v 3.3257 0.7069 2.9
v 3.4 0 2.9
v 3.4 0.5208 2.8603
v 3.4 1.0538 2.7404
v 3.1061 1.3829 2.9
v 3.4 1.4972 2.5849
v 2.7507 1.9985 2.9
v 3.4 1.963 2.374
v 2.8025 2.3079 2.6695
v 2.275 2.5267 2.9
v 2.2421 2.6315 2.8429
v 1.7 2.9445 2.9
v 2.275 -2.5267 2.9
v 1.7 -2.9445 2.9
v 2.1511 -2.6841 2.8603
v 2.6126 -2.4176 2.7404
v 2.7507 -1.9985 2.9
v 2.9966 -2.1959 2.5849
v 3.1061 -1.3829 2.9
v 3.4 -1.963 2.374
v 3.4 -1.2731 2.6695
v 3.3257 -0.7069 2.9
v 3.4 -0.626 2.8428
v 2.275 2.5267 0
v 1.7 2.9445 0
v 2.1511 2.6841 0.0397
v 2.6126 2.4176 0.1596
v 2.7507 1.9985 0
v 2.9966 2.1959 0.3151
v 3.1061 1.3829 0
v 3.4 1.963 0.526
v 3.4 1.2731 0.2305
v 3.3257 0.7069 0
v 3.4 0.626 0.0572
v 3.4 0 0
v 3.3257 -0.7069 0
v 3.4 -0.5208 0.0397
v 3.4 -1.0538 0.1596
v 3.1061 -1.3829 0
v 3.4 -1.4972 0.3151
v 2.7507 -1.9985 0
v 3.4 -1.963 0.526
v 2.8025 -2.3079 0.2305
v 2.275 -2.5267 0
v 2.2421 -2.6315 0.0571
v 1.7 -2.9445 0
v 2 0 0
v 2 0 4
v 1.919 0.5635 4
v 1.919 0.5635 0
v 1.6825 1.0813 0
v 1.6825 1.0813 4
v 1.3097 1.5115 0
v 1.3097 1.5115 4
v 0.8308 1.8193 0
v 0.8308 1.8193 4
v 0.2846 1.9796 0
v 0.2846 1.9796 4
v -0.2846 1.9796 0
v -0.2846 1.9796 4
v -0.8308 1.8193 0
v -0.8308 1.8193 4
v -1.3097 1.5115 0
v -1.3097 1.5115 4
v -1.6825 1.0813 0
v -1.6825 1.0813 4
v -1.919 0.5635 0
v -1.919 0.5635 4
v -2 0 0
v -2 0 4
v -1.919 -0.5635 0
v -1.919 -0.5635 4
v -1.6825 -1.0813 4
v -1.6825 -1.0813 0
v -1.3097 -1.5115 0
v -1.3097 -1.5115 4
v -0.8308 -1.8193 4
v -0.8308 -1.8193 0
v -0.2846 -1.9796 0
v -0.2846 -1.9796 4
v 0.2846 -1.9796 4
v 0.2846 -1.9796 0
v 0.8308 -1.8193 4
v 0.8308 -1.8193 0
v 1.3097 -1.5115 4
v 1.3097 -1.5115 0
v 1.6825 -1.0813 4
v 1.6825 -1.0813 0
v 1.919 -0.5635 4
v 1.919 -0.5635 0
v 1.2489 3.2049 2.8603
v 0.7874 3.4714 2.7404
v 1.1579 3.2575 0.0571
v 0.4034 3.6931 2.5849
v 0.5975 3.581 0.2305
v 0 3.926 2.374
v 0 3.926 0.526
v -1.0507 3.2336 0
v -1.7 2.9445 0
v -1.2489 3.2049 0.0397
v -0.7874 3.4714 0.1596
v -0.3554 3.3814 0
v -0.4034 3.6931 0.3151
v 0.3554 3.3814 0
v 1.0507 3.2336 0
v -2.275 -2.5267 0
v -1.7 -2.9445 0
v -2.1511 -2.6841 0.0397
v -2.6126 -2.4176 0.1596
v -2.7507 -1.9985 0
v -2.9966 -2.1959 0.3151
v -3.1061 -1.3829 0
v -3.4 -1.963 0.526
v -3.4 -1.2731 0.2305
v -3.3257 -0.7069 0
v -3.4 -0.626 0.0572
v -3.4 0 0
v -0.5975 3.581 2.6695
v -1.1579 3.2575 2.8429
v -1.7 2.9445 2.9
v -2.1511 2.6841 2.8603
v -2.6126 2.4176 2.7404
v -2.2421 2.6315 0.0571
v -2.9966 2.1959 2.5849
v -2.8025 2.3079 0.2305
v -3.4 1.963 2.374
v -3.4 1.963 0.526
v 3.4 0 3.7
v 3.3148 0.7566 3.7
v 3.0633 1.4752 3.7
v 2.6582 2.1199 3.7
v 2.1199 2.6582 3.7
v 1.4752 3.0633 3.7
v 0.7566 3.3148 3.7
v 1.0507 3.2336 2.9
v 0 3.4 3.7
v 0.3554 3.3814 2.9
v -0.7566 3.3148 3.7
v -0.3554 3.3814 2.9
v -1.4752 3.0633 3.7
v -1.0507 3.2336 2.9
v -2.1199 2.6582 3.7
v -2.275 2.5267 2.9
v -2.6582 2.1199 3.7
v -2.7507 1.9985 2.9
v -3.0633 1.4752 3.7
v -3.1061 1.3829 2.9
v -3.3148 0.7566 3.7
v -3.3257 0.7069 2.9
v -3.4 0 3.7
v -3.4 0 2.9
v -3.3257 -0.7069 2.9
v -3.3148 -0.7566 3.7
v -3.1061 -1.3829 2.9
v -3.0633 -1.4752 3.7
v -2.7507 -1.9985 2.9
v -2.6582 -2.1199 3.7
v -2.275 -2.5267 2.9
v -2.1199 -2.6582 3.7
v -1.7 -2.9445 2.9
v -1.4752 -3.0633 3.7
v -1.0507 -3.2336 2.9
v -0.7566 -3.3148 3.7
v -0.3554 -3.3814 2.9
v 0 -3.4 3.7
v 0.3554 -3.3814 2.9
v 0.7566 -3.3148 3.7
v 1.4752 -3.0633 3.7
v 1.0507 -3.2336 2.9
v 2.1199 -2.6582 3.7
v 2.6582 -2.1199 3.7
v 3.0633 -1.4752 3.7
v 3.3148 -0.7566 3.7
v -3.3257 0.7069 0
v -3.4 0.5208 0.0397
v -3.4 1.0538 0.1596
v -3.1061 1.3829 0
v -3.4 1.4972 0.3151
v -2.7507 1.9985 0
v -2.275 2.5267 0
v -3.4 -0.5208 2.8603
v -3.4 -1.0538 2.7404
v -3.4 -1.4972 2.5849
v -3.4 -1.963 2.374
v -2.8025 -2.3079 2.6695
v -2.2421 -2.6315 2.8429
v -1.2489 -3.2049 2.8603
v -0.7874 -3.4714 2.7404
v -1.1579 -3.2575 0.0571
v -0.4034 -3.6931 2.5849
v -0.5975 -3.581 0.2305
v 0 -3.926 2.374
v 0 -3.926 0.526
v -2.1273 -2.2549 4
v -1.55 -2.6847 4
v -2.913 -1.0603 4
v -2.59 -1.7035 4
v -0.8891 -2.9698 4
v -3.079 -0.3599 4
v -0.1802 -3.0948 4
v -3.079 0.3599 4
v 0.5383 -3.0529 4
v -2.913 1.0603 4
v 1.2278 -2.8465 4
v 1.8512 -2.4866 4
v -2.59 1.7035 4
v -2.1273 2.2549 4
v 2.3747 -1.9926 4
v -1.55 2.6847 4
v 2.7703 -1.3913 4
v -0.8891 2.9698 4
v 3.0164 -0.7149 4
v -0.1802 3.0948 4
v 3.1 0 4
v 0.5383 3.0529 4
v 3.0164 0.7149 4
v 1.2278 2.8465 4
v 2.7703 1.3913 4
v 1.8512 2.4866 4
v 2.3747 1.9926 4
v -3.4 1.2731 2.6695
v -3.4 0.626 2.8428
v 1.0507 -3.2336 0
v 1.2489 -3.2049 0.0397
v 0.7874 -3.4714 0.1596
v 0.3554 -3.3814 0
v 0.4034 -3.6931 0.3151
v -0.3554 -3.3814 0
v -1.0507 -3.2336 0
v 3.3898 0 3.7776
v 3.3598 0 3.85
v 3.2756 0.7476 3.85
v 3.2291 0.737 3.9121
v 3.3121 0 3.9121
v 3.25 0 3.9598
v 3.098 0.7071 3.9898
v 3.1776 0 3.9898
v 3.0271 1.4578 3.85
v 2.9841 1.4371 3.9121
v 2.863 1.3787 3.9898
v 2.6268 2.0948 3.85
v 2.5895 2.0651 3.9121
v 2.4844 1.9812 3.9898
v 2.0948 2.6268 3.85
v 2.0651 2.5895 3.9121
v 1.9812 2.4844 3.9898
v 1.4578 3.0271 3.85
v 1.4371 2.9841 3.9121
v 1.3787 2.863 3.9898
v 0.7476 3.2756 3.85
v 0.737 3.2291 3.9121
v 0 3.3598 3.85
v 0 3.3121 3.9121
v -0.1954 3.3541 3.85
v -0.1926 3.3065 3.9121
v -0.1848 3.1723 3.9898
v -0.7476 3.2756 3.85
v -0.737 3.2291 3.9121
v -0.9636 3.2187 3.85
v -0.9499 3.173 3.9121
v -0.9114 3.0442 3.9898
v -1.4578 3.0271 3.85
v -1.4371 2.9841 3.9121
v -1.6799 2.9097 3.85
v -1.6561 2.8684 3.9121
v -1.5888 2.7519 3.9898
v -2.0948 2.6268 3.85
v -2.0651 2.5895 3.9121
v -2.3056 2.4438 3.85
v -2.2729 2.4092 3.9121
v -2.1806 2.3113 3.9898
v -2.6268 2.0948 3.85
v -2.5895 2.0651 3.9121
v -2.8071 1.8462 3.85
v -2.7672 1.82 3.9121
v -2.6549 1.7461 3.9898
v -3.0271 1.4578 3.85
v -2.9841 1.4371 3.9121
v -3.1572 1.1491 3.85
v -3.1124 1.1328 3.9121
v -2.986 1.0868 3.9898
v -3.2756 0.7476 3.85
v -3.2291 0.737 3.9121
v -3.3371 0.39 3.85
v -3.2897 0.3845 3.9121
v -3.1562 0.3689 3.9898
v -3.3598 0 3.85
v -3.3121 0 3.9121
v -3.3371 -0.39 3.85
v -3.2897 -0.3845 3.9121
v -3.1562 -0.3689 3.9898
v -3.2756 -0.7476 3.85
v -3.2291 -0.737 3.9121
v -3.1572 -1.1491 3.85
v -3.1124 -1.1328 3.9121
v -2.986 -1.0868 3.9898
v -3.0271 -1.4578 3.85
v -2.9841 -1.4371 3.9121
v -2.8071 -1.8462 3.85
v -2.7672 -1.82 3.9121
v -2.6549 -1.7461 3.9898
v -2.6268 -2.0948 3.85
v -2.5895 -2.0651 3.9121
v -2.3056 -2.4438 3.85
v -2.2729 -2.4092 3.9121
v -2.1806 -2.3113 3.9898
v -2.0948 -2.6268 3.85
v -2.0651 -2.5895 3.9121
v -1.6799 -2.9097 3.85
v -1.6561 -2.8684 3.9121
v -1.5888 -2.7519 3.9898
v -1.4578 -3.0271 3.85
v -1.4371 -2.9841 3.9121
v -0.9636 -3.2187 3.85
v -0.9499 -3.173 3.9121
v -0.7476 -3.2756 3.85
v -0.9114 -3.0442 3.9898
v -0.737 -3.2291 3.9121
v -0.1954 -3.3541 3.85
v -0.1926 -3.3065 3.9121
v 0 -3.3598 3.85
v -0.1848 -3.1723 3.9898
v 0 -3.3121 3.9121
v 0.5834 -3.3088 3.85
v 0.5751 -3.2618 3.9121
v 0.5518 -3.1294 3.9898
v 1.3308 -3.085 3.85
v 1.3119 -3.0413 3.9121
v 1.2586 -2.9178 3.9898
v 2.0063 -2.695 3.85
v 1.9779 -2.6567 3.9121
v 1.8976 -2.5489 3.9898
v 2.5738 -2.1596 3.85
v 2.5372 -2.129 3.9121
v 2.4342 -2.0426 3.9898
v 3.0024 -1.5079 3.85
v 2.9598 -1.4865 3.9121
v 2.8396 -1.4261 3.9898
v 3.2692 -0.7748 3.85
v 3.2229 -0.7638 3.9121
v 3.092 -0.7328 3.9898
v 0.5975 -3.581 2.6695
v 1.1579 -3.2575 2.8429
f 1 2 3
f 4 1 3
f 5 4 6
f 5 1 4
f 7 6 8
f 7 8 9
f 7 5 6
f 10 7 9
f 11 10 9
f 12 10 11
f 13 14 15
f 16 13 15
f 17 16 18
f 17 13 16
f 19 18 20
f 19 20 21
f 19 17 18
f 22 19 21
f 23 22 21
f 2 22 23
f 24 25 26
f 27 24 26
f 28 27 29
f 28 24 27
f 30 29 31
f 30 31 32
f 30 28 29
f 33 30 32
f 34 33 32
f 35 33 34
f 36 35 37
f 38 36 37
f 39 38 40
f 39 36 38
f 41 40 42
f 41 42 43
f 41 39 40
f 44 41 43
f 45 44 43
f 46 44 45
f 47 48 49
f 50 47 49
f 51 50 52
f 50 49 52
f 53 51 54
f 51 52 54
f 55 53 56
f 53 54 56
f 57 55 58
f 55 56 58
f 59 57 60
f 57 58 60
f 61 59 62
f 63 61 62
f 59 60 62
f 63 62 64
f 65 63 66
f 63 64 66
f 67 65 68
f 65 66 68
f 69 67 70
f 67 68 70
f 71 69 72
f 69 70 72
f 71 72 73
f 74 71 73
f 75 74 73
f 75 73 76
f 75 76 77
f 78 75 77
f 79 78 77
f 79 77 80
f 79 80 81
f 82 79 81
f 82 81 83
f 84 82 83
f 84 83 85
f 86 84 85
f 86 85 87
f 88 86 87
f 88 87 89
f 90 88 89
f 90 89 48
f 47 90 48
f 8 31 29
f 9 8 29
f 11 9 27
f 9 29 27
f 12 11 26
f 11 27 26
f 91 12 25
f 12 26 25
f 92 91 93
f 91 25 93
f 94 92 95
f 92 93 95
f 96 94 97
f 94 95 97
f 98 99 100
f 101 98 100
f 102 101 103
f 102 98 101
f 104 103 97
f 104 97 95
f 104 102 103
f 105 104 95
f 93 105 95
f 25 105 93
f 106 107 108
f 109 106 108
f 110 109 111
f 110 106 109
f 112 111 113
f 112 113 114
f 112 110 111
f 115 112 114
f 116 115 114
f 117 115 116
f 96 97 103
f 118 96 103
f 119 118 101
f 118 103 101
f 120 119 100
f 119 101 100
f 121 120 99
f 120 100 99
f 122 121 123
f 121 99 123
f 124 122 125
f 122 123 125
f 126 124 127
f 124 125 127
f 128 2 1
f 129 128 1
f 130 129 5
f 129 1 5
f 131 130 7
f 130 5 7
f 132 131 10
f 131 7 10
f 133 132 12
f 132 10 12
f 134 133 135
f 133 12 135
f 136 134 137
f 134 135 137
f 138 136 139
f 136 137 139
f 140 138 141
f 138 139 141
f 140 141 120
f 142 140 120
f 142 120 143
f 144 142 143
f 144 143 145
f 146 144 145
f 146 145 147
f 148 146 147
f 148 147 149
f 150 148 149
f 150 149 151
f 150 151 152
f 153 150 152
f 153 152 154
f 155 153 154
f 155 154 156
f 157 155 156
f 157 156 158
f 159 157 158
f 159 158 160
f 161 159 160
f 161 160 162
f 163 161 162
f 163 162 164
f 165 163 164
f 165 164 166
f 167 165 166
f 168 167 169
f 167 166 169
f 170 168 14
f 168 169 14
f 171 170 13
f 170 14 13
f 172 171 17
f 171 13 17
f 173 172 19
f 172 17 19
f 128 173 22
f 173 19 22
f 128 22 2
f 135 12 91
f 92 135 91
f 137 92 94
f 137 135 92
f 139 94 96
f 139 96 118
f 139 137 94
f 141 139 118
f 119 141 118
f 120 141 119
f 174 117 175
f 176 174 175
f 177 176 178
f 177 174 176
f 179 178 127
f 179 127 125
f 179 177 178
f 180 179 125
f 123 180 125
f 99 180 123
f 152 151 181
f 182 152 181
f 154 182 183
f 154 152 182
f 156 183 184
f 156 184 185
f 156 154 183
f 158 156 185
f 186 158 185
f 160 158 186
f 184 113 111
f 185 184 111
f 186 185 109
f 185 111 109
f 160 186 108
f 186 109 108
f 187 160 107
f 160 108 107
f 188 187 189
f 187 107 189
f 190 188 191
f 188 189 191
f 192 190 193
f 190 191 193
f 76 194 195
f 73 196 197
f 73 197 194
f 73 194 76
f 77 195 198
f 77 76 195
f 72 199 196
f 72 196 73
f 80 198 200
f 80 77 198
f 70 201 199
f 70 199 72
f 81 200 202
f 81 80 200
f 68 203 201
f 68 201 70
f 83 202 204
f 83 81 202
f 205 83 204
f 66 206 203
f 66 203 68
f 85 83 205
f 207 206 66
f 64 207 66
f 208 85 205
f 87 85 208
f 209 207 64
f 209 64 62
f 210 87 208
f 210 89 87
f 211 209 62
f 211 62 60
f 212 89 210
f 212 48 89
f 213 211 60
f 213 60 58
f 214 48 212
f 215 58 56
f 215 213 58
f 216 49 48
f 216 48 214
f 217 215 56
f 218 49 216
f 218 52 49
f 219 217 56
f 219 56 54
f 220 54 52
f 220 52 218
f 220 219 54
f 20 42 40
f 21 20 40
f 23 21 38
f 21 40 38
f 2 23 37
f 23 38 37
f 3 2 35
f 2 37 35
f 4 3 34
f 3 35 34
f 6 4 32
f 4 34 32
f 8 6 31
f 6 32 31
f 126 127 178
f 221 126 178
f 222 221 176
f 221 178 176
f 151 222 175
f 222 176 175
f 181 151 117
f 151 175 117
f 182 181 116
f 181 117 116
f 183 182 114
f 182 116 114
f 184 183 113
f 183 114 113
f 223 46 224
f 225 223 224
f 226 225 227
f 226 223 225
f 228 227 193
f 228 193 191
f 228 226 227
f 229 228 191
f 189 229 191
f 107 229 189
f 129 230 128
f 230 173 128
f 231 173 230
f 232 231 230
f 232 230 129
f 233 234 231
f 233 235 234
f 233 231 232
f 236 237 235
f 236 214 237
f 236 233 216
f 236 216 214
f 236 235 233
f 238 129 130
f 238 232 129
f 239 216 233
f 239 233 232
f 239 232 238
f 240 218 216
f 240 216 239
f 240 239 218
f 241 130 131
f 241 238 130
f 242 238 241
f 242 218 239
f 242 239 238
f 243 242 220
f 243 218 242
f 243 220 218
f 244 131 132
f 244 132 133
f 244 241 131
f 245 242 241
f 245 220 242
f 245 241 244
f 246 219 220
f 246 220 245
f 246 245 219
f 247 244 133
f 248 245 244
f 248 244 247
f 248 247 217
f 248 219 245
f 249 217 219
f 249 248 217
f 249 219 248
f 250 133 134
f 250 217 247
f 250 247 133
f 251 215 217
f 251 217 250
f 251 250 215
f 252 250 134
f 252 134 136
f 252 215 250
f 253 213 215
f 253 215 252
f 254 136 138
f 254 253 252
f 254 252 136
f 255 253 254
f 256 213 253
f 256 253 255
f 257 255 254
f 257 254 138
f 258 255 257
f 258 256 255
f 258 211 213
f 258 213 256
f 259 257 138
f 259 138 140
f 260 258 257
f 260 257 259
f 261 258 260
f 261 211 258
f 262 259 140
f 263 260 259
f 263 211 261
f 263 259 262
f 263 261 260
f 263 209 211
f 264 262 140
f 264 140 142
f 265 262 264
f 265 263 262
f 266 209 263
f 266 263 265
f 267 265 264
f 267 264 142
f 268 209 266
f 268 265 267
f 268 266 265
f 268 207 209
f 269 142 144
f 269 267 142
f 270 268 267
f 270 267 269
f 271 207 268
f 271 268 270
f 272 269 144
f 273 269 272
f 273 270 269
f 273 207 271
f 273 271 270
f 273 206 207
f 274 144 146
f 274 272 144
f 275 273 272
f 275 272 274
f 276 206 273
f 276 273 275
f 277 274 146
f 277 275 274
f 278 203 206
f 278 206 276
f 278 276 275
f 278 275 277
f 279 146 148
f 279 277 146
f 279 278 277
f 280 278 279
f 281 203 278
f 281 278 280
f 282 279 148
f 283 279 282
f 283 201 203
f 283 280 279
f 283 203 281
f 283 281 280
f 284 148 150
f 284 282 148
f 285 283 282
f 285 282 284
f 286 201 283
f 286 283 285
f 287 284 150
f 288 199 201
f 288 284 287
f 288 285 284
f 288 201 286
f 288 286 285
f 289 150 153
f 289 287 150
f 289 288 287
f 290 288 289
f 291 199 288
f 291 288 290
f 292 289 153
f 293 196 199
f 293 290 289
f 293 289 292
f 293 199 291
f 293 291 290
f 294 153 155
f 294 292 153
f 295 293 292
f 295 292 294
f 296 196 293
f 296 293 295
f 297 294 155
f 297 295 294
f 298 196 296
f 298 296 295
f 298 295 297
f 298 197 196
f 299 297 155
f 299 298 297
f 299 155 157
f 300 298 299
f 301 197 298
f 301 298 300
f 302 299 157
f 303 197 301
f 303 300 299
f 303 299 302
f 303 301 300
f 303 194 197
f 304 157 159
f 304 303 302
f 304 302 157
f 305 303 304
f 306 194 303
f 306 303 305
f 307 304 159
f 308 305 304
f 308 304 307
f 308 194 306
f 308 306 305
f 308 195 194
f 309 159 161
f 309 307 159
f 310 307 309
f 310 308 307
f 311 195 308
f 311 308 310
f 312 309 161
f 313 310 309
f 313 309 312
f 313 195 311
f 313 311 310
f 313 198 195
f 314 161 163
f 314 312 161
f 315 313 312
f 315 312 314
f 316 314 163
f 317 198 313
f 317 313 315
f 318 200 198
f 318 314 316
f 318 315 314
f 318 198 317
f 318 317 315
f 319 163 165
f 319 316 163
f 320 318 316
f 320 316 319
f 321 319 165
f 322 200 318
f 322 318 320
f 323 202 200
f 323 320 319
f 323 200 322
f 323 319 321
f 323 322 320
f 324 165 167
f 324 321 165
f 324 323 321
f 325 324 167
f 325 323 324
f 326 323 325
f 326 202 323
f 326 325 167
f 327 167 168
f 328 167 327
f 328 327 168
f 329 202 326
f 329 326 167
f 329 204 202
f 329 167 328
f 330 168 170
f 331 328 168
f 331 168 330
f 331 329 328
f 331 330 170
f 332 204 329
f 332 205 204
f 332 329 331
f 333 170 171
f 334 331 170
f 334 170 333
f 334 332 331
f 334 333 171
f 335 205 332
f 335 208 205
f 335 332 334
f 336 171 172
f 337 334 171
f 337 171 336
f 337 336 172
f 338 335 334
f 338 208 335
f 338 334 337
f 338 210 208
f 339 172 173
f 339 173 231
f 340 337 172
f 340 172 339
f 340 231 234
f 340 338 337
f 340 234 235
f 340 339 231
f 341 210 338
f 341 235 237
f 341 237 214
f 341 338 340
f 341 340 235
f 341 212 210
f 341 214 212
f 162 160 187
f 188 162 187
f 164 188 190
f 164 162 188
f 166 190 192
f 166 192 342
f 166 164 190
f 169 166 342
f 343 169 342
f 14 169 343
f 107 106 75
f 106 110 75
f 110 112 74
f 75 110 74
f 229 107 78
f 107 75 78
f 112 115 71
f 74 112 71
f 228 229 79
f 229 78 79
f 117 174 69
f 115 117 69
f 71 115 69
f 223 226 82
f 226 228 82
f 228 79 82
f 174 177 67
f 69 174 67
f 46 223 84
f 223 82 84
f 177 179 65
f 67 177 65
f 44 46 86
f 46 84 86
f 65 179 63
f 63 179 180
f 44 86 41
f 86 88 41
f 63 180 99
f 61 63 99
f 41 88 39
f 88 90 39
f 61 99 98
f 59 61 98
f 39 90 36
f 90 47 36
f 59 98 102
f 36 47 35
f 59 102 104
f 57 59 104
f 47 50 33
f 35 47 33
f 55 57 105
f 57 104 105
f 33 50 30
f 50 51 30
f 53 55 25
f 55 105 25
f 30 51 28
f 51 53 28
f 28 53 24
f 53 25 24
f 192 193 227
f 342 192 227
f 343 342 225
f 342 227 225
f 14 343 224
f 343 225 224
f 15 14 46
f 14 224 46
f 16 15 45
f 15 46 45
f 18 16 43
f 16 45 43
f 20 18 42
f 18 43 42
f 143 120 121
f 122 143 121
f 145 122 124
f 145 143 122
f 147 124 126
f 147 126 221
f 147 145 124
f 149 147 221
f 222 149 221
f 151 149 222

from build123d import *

# Parameters (mm, degrees)
EXTRUDE_1_DEPTH      = 2.9
SKETCH_2_R           = 3.4
EXTRUDE_2_DEPTH      = 1.1
SKETCH_3_R           = 2
CUT_EXTRUDE_1_DEPTH  = 7.555404895
SKETCH_2_2_OUTSIDE_W = 13.226
SKETCH_2_2_OUTSIDE_H = 14.278
SKETCH_2_2_OUTSIDE_R = 3.4
CUT_EXTRUDE_2_DEPTH  = 1.1
CUT_EXTRUDE_2_DRAFT  = -45
SKETCH_4_OUTSIDE_W   = 13.226
SKETCH_4_OUTSIDE_H   = 14.278
SKETCH_4_OUTSIDE_R   = 3.4
CUT_EXTRUDE_3_DEPTH  = 1.1
CUT_EXTRUDE_3_DRAFT  = -45
FILLET_1_R           = 0.3


with BuildPart() as part:
    # 草图1 → 凸台-拉伸1 (new body)
    with BuildSketch(Plane.XY):
        Polygon((0, 3.92598183), (-3.4, 1.962990915), (-3.4, -1.962990915), (0, -3.92598183), (3.4, -1.962990915), (3.4, 1.962990915), align=None)
    extrude(amount=EXTRUDE_1_DEPTH)

    # 草图2 → 凸台-拉伸2 (add)
    with BuildSketch(Plane.XY.offset(2.9)):
        Circle(SKETCH_2_R)
    extrude(amount=EXTRUDE_2_DEPTH)

    # 草图3 → 切除-拉伸1 (cut, through all)
    with BuildSketch(Plane.XY.offset(4)):
        Circle(SKETCH_3_R)
    extrude(amount=-CUT_EXTRUDE_1_DEPTH, mode=Mode.SUBTRACT)


with BuildPart() as cut_extrude_2_tool:
    # 草图2<2> outside → 切除-拉伸2 (with draft: the straight prism first)
    with BuildSketch(Plane.XY.offset(2.9)):
        Rectangle(SKETCH_2_2_OUTSIDE_W, SKETCH_2_2_OUTSIDE_H)
        Circle(SKETCH_2_2_OUTSIDE_R, mode=Mode.SUBTRACT)
    extrude(amount=-CUT_EXTRUDE_2_DEPTH)
    # 切除-拉伸2: the draft: its side faces are tilted about the plane it starts from
    cut_extrude_2_sides = [cut_extrude_2_tool.faces().sort_by_distance(p)[0] for p in [
        (0, -7.139, 2.35),
        (6.613, 0, 2.35),
        (0, 7.139, 2.35),
        (-6.613, 0, 2.35),
        (-3.4, 0, 2.35),
    ]]
    draft(cut_extrude_2_sides, Plane.XY.offset(2.9), CUT_EXTRUDE_2_DRAFT)


with BuildPart() as part_1:
    add(part.part)

    # 切除-拉伸2: cut by cut_extrude_2_tool
    add(cut_extrude_2_tool.part, mode=Mode.SUBTRACT)


with BuildPart() as cut_extrude_3_tool:
    # 草图4 outside → 切除-拉伸3 (with draft: the straight prism first)
    with BuildSketch(Plane(origin=(0, 0, 0), x_dir=(-1, 0, 0), z_dir=(0, 0, -1))):
        Rectangle(SKETCH_4_OUTSIDE_W, SKETCH_4_OUTSIDE_H)
        Circle(SKETCH_4_OUTSIDE_R, mode=Mode.SUBTRACT)
    extrude(amount=-CUT_EXTRUDE_3_DEPTH)
    # 切除-拉伸3: the draft: its side faces are tilted about the plane it starts from
    cut_extrude_3_sides = [cut_extrude_3_tool.faces().sort_by_distance(p)[0] for p in [
        (0, -7.139, 0.55),
        (-6.613, 0, 0.55),
        (0, 7.139, 0.55),
        (6.613, 0, 0.55),
        (3.4, 0, 0.55),
    ]]
    draft(cut_extrude_3_sides, Plane(origin=(0, 0, 0), x_dir=(-1, 0, 0), z_dir=(0, 0, -1)), CUT_EXTRUDE_3_DRAFT)


with BuildPart() as part_2:
    add(part_1.part)

    # 切除-拉伸3: cut by cut_extrude_3_tool
    add(cut_extrude_3_tool.part, mode=Mode.SUBTRACT)

    # 圆角1
    fillet_1_edges = [part_2.edges().sort_by_distance(p)[0] for p in [
        (-3.4, 0, 4),
    ]]
    fillet(fillet_1_edges, radius=FILLET_1_R)


solid = part_2.part
